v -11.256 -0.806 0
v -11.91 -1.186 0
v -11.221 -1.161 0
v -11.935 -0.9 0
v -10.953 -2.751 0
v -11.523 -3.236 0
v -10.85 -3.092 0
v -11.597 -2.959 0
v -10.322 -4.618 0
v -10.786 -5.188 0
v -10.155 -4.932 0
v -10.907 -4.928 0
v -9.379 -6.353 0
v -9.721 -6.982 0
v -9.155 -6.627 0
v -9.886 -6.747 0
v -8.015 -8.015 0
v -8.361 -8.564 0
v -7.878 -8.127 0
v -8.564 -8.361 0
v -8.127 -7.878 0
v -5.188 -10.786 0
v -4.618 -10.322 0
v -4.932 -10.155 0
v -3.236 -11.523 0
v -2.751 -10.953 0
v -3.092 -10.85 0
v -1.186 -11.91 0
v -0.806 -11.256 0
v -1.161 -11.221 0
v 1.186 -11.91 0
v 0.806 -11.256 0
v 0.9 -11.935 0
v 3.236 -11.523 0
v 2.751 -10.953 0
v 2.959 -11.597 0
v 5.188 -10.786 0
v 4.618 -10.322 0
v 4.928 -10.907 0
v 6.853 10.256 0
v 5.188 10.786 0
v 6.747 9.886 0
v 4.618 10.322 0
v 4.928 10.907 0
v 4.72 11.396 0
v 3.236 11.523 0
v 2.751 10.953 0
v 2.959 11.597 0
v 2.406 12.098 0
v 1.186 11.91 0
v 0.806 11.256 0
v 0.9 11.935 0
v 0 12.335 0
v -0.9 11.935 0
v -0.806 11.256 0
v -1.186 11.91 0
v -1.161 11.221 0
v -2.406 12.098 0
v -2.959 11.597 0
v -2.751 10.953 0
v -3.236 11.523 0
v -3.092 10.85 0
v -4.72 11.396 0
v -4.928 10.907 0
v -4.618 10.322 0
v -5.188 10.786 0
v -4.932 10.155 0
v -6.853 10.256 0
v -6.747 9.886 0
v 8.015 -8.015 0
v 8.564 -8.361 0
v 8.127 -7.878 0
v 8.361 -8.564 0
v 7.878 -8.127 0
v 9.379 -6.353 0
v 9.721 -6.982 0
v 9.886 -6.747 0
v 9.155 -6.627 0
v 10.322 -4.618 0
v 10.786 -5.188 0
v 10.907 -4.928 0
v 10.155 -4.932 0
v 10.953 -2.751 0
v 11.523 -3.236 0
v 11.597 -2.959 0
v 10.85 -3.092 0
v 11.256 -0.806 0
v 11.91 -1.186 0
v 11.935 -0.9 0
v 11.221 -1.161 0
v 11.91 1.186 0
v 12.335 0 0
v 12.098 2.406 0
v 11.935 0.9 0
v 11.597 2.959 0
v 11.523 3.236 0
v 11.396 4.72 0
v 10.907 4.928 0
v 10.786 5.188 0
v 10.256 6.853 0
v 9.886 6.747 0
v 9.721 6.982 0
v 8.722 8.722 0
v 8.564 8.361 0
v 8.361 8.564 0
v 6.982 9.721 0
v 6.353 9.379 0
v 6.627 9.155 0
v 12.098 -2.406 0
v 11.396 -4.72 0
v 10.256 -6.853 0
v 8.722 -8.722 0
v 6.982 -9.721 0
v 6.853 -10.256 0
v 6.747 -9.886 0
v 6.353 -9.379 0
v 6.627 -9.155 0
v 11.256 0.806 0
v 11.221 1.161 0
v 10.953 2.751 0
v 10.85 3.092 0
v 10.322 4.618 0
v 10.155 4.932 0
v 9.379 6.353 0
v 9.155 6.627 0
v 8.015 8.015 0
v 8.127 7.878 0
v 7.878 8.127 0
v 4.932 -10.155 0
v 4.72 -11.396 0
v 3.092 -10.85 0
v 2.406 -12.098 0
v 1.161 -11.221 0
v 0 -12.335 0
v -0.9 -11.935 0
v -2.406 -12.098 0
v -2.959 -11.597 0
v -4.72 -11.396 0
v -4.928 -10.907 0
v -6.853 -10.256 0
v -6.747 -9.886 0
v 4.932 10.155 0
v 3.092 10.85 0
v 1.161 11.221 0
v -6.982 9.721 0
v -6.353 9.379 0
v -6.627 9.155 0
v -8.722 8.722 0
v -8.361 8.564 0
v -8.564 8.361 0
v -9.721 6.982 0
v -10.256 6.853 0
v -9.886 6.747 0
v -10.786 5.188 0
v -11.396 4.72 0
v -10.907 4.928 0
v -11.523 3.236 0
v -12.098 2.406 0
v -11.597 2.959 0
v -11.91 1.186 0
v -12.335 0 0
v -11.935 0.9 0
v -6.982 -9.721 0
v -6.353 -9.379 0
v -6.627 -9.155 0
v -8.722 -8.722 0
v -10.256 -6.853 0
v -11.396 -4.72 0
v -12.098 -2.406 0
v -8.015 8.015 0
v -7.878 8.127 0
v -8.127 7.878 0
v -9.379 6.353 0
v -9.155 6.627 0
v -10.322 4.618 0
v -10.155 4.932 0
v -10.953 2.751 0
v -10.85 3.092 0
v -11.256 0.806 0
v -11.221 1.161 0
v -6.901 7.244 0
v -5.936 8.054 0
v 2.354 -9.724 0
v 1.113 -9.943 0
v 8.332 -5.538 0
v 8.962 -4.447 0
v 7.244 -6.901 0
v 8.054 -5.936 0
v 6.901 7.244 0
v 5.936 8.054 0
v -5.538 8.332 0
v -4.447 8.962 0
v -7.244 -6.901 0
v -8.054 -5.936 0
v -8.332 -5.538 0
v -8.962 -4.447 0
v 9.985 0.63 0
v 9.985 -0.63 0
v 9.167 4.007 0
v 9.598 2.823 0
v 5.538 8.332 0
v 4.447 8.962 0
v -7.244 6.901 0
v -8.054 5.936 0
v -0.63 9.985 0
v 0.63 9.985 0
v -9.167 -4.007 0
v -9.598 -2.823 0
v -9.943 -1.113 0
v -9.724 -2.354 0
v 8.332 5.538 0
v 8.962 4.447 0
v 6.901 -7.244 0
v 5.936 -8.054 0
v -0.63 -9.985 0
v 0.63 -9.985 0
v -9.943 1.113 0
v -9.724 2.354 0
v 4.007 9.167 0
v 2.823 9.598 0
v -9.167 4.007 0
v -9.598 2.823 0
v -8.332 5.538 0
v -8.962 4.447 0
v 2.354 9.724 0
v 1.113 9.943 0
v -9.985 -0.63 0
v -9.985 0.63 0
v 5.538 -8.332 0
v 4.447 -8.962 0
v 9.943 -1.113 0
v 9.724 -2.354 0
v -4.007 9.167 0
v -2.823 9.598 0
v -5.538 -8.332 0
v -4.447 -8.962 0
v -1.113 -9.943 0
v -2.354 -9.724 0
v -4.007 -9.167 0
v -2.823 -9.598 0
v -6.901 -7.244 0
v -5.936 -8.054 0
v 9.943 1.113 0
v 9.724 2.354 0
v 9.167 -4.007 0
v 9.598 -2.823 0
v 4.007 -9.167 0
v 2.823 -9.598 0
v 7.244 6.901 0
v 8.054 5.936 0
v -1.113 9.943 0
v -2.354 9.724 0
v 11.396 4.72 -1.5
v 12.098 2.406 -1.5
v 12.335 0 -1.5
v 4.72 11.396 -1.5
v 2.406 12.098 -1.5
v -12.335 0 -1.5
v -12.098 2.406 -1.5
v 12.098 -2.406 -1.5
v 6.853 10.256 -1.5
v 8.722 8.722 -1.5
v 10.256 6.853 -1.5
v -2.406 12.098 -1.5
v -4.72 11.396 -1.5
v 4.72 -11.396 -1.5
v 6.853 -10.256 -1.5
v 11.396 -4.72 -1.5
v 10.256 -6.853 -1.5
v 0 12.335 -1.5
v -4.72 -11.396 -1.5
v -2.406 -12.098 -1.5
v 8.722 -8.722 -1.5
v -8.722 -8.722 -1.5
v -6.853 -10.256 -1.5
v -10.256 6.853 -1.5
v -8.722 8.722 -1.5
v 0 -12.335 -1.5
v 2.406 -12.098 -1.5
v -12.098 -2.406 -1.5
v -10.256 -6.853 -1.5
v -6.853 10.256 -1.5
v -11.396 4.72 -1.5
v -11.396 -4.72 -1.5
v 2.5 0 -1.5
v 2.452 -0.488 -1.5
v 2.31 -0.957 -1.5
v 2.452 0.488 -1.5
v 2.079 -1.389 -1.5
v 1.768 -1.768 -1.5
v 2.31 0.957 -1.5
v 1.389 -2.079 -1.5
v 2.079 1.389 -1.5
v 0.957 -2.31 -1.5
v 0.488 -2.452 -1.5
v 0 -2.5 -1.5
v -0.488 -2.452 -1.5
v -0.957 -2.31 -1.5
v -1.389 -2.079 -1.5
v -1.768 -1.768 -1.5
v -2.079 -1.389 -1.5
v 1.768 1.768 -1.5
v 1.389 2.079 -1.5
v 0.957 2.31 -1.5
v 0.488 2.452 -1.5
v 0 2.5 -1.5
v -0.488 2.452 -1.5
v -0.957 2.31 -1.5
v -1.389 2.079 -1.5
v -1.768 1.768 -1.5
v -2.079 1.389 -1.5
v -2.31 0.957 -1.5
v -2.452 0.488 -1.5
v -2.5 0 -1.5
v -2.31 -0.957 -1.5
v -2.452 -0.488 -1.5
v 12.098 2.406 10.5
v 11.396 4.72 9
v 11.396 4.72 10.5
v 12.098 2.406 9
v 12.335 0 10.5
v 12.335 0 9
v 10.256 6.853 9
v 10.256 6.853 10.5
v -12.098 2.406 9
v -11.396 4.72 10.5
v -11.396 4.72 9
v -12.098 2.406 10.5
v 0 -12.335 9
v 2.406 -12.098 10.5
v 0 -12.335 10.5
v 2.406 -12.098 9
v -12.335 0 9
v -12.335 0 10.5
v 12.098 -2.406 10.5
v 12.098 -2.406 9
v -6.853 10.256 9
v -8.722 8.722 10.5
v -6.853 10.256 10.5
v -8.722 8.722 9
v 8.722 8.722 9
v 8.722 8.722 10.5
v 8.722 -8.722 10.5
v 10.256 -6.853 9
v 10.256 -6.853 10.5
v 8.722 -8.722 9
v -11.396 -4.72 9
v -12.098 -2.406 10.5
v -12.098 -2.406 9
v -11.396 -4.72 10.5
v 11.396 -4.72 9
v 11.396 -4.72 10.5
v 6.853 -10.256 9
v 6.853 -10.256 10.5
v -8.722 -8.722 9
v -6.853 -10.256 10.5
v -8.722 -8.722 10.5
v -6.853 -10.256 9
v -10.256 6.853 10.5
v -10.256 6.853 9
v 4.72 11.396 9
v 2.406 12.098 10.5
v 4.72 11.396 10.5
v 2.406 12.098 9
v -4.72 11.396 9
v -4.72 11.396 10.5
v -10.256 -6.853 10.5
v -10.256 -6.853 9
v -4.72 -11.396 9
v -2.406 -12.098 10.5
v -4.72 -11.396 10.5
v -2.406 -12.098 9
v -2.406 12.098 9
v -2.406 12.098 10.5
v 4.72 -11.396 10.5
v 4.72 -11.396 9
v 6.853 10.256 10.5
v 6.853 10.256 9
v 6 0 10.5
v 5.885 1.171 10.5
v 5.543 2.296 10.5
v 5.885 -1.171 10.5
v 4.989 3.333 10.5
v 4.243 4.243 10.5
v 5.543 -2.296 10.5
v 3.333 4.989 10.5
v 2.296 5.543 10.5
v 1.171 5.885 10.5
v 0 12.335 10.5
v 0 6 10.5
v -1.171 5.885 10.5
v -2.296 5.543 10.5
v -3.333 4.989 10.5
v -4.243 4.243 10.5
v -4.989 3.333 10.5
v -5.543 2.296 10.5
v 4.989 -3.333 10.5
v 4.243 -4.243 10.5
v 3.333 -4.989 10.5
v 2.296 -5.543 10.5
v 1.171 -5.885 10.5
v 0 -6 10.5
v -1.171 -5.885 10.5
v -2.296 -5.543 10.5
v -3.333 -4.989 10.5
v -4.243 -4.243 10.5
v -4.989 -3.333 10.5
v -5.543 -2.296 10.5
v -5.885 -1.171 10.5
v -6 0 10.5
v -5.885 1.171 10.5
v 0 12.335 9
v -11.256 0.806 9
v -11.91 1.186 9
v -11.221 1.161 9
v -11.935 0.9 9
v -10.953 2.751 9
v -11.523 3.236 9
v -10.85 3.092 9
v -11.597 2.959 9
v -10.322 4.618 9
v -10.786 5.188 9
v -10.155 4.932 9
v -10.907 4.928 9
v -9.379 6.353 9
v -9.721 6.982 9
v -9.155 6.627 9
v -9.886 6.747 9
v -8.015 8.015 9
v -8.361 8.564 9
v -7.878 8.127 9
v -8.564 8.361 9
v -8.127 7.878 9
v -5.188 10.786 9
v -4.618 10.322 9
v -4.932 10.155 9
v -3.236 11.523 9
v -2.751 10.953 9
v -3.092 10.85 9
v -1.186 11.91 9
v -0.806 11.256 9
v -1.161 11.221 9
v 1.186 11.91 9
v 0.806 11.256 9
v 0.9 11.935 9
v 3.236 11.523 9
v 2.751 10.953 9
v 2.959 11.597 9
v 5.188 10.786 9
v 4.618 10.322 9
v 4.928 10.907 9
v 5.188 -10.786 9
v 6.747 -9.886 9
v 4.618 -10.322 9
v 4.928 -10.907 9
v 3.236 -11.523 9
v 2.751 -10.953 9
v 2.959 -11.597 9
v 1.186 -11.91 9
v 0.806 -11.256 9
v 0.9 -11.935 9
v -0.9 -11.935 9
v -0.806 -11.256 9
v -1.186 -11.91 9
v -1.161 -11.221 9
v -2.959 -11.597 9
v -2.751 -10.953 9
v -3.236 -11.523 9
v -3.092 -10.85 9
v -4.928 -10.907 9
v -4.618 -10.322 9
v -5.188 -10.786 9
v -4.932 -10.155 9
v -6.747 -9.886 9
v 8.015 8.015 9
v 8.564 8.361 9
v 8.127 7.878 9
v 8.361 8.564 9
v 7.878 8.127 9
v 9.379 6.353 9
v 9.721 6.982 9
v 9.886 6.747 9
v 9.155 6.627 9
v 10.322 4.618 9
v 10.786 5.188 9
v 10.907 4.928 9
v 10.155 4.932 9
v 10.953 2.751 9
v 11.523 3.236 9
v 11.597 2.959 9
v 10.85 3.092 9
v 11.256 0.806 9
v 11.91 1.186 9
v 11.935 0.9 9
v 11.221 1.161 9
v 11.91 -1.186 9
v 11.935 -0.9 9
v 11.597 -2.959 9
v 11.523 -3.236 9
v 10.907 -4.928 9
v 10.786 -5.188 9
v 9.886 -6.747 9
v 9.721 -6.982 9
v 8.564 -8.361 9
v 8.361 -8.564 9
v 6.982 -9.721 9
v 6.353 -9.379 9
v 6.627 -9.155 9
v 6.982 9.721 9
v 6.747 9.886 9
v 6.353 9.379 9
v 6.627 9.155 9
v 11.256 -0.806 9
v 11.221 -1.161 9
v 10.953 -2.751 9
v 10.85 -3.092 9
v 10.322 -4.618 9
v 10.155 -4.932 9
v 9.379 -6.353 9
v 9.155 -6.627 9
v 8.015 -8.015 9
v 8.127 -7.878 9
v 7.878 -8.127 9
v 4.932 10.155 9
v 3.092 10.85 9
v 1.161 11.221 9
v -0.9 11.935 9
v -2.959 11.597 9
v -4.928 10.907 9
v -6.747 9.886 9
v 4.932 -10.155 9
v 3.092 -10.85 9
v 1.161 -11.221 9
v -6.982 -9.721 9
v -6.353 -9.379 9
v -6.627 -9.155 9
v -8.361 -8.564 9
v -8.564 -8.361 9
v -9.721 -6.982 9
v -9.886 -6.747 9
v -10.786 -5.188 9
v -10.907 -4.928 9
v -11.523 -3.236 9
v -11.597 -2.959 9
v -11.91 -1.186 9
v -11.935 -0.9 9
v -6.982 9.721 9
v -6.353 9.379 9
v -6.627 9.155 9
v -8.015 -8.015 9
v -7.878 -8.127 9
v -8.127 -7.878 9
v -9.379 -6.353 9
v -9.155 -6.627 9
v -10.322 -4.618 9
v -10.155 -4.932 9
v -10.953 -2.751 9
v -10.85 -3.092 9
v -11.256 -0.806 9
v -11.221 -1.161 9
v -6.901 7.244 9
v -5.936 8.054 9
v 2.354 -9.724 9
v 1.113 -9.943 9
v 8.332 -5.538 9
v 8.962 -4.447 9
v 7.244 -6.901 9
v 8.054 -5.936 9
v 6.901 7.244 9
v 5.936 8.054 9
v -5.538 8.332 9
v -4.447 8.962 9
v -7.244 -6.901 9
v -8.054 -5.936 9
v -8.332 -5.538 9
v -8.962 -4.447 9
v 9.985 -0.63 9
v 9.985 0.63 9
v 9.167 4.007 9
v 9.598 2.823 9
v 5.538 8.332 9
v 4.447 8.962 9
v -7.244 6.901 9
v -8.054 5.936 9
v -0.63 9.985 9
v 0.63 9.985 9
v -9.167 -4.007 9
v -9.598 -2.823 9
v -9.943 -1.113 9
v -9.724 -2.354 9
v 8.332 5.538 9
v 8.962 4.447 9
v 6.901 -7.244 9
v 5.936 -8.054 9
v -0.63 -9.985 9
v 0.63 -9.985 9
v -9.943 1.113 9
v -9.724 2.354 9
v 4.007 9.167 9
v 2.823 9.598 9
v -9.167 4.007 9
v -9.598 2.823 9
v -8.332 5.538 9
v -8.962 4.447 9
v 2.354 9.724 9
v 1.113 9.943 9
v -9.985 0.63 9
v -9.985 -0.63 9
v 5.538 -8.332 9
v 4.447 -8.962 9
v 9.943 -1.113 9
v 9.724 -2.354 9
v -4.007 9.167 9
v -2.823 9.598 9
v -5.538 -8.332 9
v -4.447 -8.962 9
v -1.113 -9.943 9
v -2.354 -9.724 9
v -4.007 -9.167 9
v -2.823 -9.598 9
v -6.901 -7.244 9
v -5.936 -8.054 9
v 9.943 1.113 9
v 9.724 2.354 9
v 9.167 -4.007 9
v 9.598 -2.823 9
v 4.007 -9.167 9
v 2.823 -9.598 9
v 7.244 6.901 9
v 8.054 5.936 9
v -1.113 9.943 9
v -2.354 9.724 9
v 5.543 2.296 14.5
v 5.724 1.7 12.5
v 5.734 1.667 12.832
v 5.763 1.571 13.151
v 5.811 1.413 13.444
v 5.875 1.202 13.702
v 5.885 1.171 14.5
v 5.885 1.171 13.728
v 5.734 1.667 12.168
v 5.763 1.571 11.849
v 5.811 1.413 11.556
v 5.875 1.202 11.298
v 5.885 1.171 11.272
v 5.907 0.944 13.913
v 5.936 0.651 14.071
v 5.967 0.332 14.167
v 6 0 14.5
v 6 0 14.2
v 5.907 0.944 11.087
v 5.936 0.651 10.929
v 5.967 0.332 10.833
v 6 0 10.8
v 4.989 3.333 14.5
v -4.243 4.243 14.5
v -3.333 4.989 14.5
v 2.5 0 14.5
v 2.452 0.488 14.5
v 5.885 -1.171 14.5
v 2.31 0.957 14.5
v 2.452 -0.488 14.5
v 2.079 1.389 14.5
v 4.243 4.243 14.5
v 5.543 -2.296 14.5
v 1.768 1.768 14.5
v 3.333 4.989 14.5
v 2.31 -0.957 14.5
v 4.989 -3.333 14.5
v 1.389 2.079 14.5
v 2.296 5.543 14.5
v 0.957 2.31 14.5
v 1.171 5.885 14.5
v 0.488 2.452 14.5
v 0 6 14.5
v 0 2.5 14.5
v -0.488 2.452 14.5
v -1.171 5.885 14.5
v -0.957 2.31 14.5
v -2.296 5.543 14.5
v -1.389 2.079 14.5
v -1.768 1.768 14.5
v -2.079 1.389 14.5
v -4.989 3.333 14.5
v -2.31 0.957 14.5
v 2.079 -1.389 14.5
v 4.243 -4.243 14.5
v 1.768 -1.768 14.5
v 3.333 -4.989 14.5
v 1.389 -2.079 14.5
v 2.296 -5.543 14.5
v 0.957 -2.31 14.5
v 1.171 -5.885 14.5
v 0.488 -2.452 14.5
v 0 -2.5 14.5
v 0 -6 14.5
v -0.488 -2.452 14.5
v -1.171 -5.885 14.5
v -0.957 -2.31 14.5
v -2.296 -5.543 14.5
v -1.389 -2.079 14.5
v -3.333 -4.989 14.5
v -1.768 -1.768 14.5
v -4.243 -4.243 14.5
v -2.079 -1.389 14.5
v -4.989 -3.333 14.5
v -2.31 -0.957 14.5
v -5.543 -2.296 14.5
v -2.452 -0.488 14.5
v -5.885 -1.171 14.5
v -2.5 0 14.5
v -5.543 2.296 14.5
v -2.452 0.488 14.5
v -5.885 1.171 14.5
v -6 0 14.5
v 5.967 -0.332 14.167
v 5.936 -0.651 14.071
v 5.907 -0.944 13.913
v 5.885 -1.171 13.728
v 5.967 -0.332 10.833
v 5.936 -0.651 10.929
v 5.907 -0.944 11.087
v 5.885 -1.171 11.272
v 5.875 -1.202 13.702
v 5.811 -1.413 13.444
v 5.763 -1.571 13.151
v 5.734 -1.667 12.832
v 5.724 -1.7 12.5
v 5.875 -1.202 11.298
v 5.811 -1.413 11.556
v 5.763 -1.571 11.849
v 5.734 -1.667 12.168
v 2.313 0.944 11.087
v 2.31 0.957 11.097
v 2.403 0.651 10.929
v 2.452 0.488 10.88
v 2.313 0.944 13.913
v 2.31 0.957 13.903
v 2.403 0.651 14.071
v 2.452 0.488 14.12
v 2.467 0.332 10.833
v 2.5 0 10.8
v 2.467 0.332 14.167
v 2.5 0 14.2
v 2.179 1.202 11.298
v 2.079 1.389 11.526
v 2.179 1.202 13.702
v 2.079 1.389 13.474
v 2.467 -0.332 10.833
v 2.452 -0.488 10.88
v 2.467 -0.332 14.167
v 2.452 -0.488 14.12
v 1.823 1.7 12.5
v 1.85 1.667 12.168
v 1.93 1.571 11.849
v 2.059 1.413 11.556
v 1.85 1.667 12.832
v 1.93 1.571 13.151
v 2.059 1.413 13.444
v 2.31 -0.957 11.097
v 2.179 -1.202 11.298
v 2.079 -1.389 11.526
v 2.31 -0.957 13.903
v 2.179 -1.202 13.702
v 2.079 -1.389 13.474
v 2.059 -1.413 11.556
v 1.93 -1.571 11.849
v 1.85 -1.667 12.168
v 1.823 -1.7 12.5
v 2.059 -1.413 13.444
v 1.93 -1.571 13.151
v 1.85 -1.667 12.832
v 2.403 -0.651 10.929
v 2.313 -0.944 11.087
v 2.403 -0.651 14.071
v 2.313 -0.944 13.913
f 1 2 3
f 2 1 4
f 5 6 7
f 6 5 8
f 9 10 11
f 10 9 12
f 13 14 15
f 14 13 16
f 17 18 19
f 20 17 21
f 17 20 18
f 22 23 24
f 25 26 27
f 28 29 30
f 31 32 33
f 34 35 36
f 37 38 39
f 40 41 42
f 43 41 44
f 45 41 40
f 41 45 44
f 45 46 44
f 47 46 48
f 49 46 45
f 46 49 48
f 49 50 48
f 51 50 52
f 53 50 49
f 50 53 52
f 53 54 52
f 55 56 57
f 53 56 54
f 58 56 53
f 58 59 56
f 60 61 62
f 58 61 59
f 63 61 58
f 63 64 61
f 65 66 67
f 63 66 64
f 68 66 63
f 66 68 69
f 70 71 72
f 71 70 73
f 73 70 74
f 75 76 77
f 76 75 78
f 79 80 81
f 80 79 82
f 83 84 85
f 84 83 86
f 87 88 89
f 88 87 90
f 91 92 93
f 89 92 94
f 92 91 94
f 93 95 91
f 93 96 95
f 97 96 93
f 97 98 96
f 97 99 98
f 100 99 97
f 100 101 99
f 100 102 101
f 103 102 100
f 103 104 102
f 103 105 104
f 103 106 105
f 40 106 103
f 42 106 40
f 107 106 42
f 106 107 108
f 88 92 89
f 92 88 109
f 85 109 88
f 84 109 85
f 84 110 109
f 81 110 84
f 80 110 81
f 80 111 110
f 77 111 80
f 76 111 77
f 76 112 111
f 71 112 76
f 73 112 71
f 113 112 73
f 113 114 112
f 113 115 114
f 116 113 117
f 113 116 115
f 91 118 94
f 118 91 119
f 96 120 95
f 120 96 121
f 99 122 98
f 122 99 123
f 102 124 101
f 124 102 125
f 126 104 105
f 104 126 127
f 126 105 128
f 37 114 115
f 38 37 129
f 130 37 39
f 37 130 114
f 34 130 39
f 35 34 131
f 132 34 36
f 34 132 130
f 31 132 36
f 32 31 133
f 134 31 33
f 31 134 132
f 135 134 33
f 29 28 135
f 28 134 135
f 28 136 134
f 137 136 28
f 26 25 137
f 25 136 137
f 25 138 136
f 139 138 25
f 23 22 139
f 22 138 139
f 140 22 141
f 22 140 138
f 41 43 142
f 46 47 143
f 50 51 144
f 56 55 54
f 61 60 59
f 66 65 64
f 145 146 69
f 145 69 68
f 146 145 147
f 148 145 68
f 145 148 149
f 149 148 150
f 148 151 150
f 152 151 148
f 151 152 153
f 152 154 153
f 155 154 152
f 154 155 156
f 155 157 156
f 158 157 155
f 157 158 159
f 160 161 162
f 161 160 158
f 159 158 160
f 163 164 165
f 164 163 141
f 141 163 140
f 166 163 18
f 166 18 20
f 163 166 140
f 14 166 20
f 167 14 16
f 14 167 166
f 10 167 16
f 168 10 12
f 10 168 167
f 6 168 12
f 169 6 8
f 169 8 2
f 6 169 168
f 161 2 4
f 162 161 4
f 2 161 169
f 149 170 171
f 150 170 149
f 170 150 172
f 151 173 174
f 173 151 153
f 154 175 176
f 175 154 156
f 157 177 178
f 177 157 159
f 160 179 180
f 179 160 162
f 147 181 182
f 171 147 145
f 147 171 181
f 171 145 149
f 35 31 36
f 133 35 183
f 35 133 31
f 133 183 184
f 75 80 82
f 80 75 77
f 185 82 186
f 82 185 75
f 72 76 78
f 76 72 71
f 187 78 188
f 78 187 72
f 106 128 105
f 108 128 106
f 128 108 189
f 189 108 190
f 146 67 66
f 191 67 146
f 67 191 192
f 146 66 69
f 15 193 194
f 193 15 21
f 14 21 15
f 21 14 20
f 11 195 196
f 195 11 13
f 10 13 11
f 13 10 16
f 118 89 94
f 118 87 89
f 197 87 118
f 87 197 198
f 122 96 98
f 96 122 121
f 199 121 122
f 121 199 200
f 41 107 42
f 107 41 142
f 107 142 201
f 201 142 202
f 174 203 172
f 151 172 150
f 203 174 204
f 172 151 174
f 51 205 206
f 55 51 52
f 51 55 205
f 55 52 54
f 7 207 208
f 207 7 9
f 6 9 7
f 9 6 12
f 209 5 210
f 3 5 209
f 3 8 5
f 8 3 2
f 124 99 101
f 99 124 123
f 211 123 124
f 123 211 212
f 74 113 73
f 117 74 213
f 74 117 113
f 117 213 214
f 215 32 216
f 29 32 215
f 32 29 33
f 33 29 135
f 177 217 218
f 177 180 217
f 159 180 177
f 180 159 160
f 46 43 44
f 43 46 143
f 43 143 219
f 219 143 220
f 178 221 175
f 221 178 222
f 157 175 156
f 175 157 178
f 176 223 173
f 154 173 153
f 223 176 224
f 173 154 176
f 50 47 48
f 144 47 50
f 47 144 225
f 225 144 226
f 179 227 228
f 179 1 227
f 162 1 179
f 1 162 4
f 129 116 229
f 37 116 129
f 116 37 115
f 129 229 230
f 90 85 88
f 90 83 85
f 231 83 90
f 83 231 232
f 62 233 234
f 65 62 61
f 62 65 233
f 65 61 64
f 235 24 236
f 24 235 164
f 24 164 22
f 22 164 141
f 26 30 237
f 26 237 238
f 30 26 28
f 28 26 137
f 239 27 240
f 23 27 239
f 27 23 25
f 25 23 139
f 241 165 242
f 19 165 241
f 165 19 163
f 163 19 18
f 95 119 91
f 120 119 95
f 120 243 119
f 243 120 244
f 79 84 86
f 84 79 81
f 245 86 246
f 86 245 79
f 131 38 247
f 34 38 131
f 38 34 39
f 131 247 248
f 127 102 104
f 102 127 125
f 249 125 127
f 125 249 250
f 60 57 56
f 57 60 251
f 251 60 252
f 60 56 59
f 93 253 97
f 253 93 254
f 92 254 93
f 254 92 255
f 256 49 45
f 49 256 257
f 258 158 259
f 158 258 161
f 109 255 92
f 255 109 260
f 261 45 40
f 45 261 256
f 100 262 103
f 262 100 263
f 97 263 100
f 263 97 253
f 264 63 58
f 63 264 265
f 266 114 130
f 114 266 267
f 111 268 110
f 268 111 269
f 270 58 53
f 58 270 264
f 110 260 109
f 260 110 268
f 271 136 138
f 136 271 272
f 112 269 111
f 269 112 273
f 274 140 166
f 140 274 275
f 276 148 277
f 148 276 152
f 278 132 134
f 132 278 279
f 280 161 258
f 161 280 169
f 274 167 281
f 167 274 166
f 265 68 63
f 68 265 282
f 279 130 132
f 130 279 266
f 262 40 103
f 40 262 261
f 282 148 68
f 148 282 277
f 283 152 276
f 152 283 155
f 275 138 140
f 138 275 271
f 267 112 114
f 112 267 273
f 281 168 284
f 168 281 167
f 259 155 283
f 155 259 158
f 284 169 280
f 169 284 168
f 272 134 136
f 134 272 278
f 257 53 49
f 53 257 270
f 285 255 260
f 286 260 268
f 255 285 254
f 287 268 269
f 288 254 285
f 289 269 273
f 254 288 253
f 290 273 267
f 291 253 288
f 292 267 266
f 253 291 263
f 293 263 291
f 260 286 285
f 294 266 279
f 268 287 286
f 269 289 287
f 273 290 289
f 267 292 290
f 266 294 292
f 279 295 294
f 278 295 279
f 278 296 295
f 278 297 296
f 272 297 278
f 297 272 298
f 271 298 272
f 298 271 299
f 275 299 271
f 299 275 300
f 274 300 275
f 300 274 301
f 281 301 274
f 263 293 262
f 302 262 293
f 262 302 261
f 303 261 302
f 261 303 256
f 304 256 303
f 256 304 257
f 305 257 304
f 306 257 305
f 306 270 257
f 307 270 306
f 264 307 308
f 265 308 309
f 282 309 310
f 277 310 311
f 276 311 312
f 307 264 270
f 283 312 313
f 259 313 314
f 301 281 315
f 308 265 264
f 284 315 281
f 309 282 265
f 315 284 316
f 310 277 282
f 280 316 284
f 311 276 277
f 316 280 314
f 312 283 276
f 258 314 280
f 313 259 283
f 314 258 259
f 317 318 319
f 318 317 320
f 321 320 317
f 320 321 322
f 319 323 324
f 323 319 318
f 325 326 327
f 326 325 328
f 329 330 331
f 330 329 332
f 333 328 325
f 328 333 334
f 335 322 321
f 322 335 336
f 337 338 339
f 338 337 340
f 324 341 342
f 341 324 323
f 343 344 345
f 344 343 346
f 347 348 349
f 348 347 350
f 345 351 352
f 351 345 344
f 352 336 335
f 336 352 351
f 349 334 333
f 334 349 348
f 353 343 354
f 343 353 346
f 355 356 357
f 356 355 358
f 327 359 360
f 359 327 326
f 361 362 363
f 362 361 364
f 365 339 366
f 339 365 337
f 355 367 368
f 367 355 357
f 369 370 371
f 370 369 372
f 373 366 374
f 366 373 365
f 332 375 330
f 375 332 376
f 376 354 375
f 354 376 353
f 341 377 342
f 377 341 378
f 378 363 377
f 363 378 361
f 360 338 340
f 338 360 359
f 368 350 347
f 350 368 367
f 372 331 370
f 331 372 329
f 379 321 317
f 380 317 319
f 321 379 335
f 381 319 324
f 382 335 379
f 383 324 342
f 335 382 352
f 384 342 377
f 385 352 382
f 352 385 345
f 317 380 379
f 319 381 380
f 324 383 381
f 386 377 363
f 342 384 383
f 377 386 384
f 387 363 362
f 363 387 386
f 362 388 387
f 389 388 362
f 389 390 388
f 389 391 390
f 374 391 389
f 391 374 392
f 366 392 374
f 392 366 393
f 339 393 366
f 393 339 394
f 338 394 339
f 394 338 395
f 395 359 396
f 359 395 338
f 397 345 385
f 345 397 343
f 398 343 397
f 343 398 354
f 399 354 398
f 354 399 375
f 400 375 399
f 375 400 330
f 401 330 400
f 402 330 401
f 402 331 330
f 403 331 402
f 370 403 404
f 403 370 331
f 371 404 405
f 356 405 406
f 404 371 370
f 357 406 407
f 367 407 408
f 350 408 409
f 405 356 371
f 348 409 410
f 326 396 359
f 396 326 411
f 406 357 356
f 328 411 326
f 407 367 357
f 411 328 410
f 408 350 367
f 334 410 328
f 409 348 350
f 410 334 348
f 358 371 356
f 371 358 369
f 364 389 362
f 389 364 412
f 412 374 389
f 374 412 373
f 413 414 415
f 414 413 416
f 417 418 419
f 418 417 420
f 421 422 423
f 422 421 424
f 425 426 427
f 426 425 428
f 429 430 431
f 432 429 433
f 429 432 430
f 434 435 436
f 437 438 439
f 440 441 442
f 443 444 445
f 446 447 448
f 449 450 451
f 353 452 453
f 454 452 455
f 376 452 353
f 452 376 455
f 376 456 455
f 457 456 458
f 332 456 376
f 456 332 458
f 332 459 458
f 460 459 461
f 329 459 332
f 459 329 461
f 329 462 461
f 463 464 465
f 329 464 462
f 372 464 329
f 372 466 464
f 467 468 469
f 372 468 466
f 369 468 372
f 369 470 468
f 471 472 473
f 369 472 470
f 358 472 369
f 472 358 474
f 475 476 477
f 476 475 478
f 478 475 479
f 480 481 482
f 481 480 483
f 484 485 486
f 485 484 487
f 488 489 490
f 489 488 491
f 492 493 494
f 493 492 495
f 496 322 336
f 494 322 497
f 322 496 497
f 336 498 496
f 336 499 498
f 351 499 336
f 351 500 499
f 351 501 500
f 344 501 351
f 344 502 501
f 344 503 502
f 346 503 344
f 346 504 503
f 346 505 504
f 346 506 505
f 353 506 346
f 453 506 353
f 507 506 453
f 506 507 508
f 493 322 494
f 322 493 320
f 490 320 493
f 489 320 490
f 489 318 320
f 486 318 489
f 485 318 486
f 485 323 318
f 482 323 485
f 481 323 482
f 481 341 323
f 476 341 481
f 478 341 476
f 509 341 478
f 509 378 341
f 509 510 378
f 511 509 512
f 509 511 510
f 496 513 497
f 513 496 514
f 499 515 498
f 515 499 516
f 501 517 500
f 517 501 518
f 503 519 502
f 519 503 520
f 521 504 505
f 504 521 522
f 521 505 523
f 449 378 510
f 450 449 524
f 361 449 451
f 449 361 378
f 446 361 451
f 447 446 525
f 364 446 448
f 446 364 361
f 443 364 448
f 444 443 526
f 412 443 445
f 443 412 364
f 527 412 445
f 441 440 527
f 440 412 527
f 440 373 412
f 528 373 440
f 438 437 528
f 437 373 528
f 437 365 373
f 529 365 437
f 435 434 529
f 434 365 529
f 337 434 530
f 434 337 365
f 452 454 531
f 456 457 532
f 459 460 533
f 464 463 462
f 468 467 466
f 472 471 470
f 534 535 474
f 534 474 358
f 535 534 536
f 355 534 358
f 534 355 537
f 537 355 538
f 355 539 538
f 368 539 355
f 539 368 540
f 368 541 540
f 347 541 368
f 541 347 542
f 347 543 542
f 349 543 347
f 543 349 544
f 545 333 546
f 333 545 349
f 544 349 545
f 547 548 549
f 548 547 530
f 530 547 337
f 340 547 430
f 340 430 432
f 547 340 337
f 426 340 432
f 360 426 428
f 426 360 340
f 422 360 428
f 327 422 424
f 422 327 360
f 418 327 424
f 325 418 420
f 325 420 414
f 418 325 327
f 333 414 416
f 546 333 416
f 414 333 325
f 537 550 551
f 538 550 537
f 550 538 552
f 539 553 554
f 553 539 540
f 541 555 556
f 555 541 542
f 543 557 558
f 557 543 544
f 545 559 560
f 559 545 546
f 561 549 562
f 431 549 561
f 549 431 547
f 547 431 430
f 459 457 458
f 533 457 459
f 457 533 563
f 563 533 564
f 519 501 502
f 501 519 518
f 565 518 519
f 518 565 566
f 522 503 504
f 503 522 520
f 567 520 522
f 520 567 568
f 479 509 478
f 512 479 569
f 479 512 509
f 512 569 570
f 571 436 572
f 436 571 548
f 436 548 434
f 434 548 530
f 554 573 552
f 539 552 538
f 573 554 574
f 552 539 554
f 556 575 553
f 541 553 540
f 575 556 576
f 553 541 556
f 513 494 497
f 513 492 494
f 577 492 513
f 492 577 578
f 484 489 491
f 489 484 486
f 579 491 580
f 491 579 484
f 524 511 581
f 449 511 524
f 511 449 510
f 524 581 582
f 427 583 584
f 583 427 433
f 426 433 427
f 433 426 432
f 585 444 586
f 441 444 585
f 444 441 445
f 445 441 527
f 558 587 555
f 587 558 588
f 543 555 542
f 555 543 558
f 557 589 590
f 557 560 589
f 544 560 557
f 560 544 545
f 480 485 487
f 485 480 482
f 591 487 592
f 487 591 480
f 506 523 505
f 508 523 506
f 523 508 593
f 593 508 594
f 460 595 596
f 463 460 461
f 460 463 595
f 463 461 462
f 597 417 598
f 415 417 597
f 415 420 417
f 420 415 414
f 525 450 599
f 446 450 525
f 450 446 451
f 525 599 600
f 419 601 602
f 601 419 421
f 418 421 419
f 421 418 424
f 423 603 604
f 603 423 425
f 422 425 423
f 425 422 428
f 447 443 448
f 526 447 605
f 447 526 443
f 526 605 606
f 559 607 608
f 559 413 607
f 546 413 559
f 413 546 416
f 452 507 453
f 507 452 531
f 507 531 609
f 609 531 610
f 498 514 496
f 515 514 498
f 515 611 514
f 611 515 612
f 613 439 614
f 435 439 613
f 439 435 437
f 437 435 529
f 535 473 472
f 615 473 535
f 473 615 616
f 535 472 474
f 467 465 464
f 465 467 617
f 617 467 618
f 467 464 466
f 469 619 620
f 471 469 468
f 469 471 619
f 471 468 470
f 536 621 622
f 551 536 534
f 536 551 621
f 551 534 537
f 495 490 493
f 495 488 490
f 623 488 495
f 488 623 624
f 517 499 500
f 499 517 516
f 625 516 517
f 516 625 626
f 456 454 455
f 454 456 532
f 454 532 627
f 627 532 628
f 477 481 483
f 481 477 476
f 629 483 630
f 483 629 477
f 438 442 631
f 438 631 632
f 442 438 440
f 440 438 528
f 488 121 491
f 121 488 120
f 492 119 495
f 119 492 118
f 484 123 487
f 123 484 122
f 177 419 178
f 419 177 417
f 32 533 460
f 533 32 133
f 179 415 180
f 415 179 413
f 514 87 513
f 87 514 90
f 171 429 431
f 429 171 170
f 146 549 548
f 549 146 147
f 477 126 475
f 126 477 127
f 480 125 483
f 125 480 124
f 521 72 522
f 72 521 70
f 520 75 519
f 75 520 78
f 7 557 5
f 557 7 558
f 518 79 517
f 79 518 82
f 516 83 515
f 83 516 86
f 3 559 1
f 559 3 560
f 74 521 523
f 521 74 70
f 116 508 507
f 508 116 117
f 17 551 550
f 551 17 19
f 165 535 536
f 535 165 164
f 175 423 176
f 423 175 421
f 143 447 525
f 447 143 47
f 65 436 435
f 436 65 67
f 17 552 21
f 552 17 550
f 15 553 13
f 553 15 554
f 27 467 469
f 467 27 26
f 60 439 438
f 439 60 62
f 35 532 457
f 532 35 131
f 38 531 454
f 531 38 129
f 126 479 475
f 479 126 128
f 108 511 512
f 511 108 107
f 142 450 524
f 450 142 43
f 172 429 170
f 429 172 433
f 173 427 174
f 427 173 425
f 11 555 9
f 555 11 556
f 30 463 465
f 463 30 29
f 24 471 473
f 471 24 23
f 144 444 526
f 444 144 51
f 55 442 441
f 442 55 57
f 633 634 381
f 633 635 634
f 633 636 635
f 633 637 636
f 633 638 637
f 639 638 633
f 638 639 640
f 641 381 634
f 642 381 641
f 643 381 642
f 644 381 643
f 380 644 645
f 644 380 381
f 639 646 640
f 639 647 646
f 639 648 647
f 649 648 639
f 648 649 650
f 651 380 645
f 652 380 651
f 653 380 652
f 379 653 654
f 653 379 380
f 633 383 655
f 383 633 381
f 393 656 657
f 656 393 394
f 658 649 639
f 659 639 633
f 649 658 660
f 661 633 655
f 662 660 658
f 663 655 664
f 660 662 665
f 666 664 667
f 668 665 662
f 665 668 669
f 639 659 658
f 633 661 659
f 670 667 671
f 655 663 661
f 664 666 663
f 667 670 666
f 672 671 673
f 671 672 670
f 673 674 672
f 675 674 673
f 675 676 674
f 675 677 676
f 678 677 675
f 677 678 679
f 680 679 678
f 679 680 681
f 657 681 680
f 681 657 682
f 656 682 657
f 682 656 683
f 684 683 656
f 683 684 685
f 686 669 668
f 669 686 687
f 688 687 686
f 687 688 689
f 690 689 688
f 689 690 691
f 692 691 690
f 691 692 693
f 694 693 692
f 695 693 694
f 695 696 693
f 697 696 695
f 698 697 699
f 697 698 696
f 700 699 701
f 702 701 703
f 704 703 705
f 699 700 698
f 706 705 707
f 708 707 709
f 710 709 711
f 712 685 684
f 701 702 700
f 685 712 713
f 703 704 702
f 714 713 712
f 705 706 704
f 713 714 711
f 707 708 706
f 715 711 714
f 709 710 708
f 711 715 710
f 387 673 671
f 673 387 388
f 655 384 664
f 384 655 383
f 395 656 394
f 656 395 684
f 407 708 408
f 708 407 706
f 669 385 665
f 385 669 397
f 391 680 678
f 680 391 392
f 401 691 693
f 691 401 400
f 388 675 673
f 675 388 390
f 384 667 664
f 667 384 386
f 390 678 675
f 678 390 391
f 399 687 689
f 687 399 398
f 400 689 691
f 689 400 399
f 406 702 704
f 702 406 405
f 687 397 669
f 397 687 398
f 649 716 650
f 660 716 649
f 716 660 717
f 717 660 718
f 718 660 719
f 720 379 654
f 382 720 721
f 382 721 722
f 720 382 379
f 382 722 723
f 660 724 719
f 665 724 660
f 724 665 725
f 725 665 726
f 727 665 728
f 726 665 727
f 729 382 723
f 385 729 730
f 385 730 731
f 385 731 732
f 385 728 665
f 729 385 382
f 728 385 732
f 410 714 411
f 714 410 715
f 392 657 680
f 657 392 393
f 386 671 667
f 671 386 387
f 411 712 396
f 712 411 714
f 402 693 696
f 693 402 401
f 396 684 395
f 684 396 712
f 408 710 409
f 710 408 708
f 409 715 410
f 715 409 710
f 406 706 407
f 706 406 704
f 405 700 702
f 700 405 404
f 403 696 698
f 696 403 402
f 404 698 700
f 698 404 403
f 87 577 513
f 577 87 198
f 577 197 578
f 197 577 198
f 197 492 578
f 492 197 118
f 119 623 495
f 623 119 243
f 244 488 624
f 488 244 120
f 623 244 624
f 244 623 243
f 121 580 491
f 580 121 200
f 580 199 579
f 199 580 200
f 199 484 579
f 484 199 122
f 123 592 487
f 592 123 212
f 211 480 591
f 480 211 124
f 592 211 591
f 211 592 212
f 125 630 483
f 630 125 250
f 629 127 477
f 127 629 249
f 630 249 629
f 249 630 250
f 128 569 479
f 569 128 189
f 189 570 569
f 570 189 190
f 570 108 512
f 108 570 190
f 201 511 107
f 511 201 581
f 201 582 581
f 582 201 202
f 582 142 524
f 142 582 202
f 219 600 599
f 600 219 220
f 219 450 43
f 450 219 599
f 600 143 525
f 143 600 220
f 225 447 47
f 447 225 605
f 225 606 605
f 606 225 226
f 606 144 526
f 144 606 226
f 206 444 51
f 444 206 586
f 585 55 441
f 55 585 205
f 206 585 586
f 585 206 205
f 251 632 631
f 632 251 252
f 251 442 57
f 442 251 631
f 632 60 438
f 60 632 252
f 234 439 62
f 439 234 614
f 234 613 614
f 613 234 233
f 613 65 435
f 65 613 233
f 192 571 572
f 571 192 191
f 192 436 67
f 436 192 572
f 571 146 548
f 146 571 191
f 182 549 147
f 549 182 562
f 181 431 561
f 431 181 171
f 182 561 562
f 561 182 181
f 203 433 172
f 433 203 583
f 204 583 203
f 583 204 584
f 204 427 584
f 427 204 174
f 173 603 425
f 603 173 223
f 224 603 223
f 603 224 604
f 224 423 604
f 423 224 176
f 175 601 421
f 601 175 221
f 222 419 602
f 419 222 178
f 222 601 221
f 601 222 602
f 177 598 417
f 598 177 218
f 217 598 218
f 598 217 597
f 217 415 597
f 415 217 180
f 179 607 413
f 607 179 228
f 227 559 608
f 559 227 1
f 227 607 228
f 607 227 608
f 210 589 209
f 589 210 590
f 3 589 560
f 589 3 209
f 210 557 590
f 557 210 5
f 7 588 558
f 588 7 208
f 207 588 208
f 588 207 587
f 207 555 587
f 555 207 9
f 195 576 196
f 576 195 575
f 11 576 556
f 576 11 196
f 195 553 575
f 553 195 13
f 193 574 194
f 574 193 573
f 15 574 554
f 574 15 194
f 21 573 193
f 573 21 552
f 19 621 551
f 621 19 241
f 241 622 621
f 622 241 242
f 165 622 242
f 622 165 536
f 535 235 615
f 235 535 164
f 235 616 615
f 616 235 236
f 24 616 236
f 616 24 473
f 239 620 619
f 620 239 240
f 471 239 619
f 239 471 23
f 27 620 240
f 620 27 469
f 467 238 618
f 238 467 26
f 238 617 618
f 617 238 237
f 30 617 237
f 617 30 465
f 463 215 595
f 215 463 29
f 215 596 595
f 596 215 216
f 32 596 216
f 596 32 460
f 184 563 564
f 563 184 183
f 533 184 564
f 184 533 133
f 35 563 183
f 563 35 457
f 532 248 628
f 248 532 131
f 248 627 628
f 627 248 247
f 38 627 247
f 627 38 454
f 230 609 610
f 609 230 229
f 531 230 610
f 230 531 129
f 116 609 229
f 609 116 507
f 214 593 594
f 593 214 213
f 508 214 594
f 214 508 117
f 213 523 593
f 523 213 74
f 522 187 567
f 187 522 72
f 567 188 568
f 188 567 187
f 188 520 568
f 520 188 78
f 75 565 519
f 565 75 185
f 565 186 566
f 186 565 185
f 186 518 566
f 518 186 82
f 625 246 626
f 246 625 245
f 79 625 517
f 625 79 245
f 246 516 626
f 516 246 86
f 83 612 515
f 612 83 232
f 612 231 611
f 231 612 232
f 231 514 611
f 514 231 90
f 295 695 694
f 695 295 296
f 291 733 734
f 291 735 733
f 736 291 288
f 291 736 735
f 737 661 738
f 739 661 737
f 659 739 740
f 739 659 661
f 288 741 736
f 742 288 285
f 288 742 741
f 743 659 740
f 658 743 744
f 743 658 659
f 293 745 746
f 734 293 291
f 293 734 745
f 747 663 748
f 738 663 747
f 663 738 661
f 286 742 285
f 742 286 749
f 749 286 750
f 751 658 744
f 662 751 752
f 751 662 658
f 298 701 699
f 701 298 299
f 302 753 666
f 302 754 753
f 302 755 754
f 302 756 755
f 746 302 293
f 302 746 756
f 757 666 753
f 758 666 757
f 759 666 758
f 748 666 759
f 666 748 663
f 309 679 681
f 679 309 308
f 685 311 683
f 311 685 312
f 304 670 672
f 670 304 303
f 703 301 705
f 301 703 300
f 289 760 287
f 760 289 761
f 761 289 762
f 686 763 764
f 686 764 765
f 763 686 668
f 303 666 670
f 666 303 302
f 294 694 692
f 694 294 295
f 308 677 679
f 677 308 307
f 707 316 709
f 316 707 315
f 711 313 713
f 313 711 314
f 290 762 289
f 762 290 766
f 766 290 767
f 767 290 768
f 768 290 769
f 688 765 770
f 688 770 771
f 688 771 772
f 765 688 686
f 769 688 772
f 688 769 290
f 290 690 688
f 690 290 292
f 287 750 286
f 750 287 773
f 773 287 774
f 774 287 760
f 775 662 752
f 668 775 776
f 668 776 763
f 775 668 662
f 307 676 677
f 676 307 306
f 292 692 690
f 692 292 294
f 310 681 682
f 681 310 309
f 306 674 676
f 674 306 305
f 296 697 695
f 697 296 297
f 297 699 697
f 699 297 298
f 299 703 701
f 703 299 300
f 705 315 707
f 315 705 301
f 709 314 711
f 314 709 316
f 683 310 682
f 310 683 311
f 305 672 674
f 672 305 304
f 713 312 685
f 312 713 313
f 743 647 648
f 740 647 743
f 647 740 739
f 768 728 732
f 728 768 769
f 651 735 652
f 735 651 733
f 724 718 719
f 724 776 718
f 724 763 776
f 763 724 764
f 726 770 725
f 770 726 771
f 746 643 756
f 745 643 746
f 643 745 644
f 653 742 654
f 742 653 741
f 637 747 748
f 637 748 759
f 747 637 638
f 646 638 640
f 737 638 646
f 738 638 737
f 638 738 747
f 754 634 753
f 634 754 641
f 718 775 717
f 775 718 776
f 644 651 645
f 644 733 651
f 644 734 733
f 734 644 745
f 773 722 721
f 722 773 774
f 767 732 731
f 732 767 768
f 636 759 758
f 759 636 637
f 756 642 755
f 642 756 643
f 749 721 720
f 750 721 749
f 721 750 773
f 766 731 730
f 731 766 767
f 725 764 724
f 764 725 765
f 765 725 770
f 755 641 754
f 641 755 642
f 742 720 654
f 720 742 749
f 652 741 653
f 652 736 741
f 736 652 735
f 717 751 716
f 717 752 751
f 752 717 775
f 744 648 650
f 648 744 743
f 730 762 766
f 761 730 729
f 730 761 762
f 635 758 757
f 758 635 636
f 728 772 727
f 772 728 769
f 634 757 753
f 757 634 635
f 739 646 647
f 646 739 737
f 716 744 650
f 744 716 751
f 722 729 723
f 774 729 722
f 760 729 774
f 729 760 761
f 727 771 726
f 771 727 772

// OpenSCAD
$fn = 32;

// ----------------------------------------------------------------------
// Timing pulley: GT2 36T, pitch 2 mm, 24.67 mm x 16 mm
// ----------------------------------------------------------------------

// --- parameters (mm) ---
belt_pitch = 2;           // belt pitch
n_teeth = 36;             // number of grooves
rim_w = 9;                // belt width between the flanges
tip_d = 22.67;            // tip circle diameter
root_d = 21.17;           // groove bottom diameter
groove_h = 0.75;          // groove depth
tooth_w = 1.5;            // groove width at the tip circle
rim_d = 24.67;            // flange diameter
rim_t = 1.5;              // flange thickness
spigot_d = 19.57;         // flange spigot, sunk into the rim
spigot_h = 1.2;           // spigot depth into the rim
shaft_d = 5;              // shaft bore
hub_d = 12;               // hub diameter
hub_h = 4;                // hub above the flange
bottom_z = -1.5;          // lowest point of the pulley
top_z = 14.5;             // highest point of the pulley
set_d = 3.4;              // set screw tap hole

module rim() {
  cylinder(h = rim_w, d = tip_d);
}

module groove_cutter() {
  /* belt tooth groove: deeper than wide, cut through the belt width */
  translate([root_d / 2, 0, 0])
    linear_extrude(height = rim_w)
      polygon(points = [[-0.6, -tooth_w * 0.42], [groove_h + 0.6, -tooth_w * 0.6],
                        [groove_h + 0.6, tooth_w * 0.6], [-0.6, tooth_w * 0.42]]);
}

module flanges() {
  translate([0, 0, -rim_t]) cylinder(h = rim_t, d = rim_d);
  translate([0, 0, rim_w]) cylinder(h = rim_t, d = rim_d);
  translate([0, 0, -spigot_h]) cylinder(h = spigot_h + 0.6, d = spigot_d);
  translate([0, 0, rim_w - 0.6]) cylinder(h = spigot_h + 0.6, d = spigot_d);
}

module hub() {
  translate([0, 0, bottom_z]) cylinder(h = top_z - bottom_z, d = hub_d);
}

difference() {
  union() {
    rim();
    hub();
    flanges();
  }
  for (i = [0 : n_teeth - 1]) rotate([0, 0, i * 360 / n_teeth]) groove_cutter();
  translate([0, 0, bottom_z - 1]) cylinder(h = top_z - bottom_z + 2, d = shaft_d);
  translate([-1, 0, top_z - hub_h * 0.5]) rotate([0, 90, 0]) cylinder(h = hub_d / 2 + 3, d = set_d);
}
